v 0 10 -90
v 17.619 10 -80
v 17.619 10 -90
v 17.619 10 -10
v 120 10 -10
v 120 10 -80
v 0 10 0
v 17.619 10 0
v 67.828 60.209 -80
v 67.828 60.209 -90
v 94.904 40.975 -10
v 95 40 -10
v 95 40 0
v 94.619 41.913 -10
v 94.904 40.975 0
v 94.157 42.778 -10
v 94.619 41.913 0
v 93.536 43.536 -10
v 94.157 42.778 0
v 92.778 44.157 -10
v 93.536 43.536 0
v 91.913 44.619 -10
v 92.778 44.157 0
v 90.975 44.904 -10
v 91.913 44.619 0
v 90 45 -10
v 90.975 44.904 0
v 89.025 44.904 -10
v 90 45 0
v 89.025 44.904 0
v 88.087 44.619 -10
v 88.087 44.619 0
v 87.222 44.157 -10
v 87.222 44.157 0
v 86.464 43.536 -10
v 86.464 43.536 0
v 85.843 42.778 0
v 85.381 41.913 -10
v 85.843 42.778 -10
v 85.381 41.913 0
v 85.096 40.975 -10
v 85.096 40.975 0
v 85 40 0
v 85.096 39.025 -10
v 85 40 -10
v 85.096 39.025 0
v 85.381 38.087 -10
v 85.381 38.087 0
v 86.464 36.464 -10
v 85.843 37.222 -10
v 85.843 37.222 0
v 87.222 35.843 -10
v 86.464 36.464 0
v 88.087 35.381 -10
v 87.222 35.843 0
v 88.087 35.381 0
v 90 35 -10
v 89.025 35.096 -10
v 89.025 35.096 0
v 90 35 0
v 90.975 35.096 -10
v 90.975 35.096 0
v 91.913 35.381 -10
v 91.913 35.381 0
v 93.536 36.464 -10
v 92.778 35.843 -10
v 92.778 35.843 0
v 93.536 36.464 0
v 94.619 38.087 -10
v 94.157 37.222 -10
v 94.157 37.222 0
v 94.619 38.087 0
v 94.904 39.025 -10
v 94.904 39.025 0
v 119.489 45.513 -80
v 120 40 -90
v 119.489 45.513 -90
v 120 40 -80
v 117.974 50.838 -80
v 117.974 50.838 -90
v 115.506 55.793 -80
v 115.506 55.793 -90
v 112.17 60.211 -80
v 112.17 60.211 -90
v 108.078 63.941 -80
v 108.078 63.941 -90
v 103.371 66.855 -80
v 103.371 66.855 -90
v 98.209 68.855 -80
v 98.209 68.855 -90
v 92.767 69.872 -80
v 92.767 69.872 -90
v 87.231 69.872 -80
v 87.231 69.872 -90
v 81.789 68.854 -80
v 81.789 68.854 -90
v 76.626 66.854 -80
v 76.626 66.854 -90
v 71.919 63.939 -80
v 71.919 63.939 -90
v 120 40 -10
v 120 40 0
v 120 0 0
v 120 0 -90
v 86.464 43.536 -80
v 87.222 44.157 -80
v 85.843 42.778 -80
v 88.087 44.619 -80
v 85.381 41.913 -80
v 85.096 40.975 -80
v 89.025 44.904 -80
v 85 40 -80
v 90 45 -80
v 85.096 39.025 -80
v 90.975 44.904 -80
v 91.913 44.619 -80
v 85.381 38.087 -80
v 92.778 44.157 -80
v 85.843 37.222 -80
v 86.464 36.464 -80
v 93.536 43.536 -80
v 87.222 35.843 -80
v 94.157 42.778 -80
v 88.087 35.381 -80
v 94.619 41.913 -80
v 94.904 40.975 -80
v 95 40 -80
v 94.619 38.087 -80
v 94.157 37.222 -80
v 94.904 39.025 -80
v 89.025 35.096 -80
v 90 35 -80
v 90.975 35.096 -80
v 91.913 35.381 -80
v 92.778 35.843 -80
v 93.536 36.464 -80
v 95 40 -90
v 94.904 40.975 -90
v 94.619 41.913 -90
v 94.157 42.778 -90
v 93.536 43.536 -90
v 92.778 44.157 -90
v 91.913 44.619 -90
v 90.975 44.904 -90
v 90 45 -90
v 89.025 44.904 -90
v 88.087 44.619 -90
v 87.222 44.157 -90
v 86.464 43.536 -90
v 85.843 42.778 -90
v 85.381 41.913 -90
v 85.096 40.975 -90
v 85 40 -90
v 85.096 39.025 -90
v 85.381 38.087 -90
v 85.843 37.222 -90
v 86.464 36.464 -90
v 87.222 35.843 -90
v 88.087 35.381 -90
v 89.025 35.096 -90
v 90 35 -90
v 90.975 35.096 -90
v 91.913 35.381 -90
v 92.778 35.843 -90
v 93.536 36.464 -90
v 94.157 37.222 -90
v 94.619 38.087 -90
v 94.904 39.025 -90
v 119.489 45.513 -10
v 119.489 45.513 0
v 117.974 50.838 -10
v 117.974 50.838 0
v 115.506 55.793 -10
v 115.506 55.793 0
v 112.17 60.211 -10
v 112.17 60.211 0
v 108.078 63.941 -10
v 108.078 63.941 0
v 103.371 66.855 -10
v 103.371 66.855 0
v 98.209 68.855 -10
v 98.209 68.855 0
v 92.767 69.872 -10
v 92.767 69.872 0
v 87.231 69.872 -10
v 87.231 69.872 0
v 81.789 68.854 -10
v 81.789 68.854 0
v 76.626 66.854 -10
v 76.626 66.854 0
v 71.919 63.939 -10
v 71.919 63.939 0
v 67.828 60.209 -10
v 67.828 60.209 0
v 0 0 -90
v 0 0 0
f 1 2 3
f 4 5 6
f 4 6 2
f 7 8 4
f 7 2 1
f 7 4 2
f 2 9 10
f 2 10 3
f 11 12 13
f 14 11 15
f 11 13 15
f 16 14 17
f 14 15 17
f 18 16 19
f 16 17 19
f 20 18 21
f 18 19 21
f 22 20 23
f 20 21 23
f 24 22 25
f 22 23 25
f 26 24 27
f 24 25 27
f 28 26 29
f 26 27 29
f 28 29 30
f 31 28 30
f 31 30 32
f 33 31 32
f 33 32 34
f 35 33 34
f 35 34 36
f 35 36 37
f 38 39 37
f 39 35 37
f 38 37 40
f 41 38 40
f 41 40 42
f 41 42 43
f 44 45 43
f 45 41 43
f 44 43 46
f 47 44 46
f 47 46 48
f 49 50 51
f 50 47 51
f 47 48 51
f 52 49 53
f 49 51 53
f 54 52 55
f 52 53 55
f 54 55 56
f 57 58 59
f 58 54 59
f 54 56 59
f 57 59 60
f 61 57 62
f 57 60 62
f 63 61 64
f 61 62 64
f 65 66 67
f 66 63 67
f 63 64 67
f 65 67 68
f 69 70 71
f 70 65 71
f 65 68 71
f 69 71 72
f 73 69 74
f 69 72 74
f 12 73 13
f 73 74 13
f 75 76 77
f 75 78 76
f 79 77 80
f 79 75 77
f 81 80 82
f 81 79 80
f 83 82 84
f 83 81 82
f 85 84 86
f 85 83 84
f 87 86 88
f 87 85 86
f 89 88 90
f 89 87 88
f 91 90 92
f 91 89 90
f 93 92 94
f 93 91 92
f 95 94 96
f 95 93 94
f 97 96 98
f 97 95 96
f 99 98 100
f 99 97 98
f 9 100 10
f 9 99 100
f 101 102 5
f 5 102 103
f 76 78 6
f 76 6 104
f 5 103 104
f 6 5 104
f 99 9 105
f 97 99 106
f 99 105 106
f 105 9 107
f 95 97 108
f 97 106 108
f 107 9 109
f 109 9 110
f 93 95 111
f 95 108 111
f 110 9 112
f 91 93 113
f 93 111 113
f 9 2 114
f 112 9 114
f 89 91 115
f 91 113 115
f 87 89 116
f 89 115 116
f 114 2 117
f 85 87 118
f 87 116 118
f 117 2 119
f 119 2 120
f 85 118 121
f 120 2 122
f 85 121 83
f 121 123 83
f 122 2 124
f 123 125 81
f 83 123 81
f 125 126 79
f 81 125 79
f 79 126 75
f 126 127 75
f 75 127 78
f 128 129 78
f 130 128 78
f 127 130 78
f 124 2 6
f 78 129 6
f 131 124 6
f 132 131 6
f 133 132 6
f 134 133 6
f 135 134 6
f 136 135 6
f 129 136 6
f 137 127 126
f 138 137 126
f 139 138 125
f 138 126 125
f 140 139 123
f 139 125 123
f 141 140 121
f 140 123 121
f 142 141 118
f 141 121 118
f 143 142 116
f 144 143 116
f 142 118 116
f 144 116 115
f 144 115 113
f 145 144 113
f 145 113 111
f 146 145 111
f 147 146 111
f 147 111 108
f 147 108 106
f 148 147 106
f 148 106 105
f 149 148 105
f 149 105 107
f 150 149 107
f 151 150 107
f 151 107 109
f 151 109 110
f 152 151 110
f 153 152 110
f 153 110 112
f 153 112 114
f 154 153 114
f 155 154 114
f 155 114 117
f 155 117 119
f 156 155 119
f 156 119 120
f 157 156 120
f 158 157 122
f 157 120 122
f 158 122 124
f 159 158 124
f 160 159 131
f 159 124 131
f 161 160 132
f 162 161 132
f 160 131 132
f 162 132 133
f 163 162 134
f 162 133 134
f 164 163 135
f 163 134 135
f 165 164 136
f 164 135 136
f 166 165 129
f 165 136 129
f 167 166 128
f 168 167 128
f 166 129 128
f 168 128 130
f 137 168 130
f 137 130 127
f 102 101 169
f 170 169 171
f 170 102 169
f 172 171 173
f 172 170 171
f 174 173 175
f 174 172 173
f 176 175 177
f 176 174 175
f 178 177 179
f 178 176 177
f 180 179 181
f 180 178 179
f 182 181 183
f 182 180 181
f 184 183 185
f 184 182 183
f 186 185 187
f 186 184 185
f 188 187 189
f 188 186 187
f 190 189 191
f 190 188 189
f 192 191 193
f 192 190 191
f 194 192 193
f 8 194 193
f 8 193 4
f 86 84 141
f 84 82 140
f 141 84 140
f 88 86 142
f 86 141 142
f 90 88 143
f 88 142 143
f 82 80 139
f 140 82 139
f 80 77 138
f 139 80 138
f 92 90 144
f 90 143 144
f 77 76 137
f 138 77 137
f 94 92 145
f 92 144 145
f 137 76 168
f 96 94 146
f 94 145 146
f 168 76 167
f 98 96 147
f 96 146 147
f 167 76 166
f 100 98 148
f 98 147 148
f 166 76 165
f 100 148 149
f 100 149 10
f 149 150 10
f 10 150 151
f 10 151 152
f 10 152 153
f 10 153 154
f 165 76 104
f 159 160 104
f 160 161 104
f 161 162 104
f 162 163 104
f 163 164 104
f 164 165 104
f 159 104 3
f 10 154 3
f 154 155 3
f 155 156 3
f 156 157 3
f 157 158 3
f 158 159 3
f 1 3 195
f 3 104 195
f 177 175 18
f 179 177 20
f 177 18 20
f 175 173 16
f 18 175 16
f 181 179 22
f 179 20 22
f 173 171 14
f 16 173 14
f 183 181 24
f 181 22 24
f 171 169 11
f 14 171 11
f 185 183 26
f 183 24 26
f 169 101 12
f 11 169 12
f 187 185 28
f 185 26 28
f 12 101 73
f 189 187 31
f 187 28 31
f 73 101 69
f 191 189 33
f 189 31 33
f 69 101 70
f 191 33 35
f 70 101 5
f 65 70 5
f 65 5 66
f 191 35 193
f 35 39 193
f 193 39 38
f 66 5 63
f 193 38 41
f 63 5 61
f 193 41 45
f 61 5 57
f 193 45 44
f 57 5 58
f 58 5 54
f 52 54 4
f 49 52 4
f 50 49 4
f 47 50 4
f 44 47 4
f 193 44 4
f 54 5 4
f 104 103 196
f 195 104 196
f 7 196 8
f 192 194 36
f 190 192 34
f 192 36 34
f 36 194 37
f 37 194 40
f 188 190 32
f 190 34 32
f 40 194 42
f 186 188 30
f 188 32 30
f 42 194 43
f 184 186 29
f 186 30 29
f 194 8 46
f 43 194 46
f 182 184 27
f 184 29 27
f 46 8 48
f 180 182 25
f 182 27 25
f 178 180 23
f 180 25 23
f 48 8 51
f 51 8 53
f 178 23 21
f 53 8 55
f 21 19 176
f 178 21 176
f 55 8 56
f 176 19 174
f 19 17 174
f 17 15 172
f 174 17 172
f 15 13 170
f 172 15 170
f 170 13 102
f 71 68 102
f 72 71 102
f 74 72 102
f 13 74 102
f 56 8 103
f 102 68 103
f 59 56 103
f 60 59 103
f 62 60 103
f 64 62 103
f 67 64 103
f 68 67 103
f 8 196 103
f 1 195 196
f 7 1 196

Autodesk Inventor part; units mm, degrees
ref_plane "YZ Plane" through (0, 0, 0) normal (1, 0, 0) x (0, 1, 0)
ref_plane "XZ Plane" through (0, 0, 0) normal (0, 1, 0) x (-1, 0, 0)
ref_plane "XY Plane" through (0, 0, 0) normal (0, 0, 1) x (1, 0, 0)
sketch "Sketch1" plane through (0, 0, 0) normal (0, 1, 0) x (-1, 0, 0)
  line L0 (0, 0) -> (-120, 0)
  line L1 (-120, 0) -> (-120, -90)
  line L2 (-120, -90) -> (0, -90)
  line L3 (0, -90) -> (0, 0)
  dimension "d0" = 120
  dimension "d1" = 90
extrude "Extrusion1" add sketch "Sketch1" along normal blind 10
sketch "Sketch2" plane through (0, 10, 0) normal (0, 1, 0) x (1, 0, 0)
  point P0 (0, 0)
sketch "Sketch3" plane through (0, 10, 0) normal (0, 1, 0) x (1, 0, 0)
  line L0 (120, 0) -> (120, 90) projected
  line L1 (120, 0) -> (120, 10)
  line L2 (120, 10) -> (60, 10)
  line L3 (0, 0) -> (120, 0) projected
  line L4 (60, 10) -> (60, 0)
  line L5 (60, 0) -> (120, 0)
  line L6 (60, 0) -> (60, 90) construction
  line L7 (60, 90) -> (60, 80)
  line L8 (60, 80) -> (120, 80)
  line L9 (60, 90) -> (120, 90)
  line L10 (120, 90) -> (120, 80)
  dimension "d4" = 10
  dimension "d5" = 60
  dimension "d6" = 10
extrude "Extrusion2" add sketch "Sketch3" along normal blind 60
sketch "Sketch4" plane through (0, 0, 0) normal (0, 0, 1) x (1, 0, 0)
  line L0 (60, 10) -> (60, 70) projected
  line L1 (120, 0) -> (120, 70) projected
  line L2 (60, 70) -> (120, 70)
  line L3 (120, 70) -> (120, 20)
  line L4 (120, 20) -> (60, 20)
  line L5 (60, 20) -> (60, 70)
  circle A0 centre (90, 40) radius 30
  circle A1 centre (90, 40) radius 5
  line L6 (67.8284, 60.2094) -> (135.2299, 60.2094) construction
  line L7 (67.8284, 60.2094) -> (17.619, 10)
  line L8 (60, 10) -> (0, 10) projected
  line L9 (67.8284, 60.2094) -> (138.8353, 60.2094) construction
  line L10 (120, 10) -> (60, 10) projected
  line L11 (17.619, 10) -> (60, 10)
  line L12 (60, 10) -> (60, 40)
  point P0 (0, 0)
  point P1 (90, 70)
  point P2 (120, 40)
  dimension "d9" = 50
  dimension "d10" = 10
  dimension "d14" = 135
extrude "Extrusion3" cut sketch "Sketch4" against normal blind 100 contours L0 L7 A0 | L0 L2 A0 L7 | A0 L2 L1 | A1
extrude "Extrusion4" add sketch "Sketch4" against normal blind 90 contours L8 L7 L0 | L0 L7 A0
sketch "Sketch5" plane through (0, 0, 0) normal (1, 0, 0) x (0, 1, 0)
  line L0 (10, -10) -> (40, -10) projected
  line L1 (10, -10) -> (10, -80) projected
  line L2 (10, -10) -> (10, -80)
  line L3 (10, -80) -> (63.3463, -80)
  line L4 (63.3463, -80) -> (63.3463, -10)
  line L5 (63.3463, -10) -> (10, -10)
  point P0 (0, 0)
  dimension "d19" = 70
extrude "Extrusion5" cut sketch "Sketch5" along normal blind 90
properties part number "Foot" material "Aluminum 6061"
